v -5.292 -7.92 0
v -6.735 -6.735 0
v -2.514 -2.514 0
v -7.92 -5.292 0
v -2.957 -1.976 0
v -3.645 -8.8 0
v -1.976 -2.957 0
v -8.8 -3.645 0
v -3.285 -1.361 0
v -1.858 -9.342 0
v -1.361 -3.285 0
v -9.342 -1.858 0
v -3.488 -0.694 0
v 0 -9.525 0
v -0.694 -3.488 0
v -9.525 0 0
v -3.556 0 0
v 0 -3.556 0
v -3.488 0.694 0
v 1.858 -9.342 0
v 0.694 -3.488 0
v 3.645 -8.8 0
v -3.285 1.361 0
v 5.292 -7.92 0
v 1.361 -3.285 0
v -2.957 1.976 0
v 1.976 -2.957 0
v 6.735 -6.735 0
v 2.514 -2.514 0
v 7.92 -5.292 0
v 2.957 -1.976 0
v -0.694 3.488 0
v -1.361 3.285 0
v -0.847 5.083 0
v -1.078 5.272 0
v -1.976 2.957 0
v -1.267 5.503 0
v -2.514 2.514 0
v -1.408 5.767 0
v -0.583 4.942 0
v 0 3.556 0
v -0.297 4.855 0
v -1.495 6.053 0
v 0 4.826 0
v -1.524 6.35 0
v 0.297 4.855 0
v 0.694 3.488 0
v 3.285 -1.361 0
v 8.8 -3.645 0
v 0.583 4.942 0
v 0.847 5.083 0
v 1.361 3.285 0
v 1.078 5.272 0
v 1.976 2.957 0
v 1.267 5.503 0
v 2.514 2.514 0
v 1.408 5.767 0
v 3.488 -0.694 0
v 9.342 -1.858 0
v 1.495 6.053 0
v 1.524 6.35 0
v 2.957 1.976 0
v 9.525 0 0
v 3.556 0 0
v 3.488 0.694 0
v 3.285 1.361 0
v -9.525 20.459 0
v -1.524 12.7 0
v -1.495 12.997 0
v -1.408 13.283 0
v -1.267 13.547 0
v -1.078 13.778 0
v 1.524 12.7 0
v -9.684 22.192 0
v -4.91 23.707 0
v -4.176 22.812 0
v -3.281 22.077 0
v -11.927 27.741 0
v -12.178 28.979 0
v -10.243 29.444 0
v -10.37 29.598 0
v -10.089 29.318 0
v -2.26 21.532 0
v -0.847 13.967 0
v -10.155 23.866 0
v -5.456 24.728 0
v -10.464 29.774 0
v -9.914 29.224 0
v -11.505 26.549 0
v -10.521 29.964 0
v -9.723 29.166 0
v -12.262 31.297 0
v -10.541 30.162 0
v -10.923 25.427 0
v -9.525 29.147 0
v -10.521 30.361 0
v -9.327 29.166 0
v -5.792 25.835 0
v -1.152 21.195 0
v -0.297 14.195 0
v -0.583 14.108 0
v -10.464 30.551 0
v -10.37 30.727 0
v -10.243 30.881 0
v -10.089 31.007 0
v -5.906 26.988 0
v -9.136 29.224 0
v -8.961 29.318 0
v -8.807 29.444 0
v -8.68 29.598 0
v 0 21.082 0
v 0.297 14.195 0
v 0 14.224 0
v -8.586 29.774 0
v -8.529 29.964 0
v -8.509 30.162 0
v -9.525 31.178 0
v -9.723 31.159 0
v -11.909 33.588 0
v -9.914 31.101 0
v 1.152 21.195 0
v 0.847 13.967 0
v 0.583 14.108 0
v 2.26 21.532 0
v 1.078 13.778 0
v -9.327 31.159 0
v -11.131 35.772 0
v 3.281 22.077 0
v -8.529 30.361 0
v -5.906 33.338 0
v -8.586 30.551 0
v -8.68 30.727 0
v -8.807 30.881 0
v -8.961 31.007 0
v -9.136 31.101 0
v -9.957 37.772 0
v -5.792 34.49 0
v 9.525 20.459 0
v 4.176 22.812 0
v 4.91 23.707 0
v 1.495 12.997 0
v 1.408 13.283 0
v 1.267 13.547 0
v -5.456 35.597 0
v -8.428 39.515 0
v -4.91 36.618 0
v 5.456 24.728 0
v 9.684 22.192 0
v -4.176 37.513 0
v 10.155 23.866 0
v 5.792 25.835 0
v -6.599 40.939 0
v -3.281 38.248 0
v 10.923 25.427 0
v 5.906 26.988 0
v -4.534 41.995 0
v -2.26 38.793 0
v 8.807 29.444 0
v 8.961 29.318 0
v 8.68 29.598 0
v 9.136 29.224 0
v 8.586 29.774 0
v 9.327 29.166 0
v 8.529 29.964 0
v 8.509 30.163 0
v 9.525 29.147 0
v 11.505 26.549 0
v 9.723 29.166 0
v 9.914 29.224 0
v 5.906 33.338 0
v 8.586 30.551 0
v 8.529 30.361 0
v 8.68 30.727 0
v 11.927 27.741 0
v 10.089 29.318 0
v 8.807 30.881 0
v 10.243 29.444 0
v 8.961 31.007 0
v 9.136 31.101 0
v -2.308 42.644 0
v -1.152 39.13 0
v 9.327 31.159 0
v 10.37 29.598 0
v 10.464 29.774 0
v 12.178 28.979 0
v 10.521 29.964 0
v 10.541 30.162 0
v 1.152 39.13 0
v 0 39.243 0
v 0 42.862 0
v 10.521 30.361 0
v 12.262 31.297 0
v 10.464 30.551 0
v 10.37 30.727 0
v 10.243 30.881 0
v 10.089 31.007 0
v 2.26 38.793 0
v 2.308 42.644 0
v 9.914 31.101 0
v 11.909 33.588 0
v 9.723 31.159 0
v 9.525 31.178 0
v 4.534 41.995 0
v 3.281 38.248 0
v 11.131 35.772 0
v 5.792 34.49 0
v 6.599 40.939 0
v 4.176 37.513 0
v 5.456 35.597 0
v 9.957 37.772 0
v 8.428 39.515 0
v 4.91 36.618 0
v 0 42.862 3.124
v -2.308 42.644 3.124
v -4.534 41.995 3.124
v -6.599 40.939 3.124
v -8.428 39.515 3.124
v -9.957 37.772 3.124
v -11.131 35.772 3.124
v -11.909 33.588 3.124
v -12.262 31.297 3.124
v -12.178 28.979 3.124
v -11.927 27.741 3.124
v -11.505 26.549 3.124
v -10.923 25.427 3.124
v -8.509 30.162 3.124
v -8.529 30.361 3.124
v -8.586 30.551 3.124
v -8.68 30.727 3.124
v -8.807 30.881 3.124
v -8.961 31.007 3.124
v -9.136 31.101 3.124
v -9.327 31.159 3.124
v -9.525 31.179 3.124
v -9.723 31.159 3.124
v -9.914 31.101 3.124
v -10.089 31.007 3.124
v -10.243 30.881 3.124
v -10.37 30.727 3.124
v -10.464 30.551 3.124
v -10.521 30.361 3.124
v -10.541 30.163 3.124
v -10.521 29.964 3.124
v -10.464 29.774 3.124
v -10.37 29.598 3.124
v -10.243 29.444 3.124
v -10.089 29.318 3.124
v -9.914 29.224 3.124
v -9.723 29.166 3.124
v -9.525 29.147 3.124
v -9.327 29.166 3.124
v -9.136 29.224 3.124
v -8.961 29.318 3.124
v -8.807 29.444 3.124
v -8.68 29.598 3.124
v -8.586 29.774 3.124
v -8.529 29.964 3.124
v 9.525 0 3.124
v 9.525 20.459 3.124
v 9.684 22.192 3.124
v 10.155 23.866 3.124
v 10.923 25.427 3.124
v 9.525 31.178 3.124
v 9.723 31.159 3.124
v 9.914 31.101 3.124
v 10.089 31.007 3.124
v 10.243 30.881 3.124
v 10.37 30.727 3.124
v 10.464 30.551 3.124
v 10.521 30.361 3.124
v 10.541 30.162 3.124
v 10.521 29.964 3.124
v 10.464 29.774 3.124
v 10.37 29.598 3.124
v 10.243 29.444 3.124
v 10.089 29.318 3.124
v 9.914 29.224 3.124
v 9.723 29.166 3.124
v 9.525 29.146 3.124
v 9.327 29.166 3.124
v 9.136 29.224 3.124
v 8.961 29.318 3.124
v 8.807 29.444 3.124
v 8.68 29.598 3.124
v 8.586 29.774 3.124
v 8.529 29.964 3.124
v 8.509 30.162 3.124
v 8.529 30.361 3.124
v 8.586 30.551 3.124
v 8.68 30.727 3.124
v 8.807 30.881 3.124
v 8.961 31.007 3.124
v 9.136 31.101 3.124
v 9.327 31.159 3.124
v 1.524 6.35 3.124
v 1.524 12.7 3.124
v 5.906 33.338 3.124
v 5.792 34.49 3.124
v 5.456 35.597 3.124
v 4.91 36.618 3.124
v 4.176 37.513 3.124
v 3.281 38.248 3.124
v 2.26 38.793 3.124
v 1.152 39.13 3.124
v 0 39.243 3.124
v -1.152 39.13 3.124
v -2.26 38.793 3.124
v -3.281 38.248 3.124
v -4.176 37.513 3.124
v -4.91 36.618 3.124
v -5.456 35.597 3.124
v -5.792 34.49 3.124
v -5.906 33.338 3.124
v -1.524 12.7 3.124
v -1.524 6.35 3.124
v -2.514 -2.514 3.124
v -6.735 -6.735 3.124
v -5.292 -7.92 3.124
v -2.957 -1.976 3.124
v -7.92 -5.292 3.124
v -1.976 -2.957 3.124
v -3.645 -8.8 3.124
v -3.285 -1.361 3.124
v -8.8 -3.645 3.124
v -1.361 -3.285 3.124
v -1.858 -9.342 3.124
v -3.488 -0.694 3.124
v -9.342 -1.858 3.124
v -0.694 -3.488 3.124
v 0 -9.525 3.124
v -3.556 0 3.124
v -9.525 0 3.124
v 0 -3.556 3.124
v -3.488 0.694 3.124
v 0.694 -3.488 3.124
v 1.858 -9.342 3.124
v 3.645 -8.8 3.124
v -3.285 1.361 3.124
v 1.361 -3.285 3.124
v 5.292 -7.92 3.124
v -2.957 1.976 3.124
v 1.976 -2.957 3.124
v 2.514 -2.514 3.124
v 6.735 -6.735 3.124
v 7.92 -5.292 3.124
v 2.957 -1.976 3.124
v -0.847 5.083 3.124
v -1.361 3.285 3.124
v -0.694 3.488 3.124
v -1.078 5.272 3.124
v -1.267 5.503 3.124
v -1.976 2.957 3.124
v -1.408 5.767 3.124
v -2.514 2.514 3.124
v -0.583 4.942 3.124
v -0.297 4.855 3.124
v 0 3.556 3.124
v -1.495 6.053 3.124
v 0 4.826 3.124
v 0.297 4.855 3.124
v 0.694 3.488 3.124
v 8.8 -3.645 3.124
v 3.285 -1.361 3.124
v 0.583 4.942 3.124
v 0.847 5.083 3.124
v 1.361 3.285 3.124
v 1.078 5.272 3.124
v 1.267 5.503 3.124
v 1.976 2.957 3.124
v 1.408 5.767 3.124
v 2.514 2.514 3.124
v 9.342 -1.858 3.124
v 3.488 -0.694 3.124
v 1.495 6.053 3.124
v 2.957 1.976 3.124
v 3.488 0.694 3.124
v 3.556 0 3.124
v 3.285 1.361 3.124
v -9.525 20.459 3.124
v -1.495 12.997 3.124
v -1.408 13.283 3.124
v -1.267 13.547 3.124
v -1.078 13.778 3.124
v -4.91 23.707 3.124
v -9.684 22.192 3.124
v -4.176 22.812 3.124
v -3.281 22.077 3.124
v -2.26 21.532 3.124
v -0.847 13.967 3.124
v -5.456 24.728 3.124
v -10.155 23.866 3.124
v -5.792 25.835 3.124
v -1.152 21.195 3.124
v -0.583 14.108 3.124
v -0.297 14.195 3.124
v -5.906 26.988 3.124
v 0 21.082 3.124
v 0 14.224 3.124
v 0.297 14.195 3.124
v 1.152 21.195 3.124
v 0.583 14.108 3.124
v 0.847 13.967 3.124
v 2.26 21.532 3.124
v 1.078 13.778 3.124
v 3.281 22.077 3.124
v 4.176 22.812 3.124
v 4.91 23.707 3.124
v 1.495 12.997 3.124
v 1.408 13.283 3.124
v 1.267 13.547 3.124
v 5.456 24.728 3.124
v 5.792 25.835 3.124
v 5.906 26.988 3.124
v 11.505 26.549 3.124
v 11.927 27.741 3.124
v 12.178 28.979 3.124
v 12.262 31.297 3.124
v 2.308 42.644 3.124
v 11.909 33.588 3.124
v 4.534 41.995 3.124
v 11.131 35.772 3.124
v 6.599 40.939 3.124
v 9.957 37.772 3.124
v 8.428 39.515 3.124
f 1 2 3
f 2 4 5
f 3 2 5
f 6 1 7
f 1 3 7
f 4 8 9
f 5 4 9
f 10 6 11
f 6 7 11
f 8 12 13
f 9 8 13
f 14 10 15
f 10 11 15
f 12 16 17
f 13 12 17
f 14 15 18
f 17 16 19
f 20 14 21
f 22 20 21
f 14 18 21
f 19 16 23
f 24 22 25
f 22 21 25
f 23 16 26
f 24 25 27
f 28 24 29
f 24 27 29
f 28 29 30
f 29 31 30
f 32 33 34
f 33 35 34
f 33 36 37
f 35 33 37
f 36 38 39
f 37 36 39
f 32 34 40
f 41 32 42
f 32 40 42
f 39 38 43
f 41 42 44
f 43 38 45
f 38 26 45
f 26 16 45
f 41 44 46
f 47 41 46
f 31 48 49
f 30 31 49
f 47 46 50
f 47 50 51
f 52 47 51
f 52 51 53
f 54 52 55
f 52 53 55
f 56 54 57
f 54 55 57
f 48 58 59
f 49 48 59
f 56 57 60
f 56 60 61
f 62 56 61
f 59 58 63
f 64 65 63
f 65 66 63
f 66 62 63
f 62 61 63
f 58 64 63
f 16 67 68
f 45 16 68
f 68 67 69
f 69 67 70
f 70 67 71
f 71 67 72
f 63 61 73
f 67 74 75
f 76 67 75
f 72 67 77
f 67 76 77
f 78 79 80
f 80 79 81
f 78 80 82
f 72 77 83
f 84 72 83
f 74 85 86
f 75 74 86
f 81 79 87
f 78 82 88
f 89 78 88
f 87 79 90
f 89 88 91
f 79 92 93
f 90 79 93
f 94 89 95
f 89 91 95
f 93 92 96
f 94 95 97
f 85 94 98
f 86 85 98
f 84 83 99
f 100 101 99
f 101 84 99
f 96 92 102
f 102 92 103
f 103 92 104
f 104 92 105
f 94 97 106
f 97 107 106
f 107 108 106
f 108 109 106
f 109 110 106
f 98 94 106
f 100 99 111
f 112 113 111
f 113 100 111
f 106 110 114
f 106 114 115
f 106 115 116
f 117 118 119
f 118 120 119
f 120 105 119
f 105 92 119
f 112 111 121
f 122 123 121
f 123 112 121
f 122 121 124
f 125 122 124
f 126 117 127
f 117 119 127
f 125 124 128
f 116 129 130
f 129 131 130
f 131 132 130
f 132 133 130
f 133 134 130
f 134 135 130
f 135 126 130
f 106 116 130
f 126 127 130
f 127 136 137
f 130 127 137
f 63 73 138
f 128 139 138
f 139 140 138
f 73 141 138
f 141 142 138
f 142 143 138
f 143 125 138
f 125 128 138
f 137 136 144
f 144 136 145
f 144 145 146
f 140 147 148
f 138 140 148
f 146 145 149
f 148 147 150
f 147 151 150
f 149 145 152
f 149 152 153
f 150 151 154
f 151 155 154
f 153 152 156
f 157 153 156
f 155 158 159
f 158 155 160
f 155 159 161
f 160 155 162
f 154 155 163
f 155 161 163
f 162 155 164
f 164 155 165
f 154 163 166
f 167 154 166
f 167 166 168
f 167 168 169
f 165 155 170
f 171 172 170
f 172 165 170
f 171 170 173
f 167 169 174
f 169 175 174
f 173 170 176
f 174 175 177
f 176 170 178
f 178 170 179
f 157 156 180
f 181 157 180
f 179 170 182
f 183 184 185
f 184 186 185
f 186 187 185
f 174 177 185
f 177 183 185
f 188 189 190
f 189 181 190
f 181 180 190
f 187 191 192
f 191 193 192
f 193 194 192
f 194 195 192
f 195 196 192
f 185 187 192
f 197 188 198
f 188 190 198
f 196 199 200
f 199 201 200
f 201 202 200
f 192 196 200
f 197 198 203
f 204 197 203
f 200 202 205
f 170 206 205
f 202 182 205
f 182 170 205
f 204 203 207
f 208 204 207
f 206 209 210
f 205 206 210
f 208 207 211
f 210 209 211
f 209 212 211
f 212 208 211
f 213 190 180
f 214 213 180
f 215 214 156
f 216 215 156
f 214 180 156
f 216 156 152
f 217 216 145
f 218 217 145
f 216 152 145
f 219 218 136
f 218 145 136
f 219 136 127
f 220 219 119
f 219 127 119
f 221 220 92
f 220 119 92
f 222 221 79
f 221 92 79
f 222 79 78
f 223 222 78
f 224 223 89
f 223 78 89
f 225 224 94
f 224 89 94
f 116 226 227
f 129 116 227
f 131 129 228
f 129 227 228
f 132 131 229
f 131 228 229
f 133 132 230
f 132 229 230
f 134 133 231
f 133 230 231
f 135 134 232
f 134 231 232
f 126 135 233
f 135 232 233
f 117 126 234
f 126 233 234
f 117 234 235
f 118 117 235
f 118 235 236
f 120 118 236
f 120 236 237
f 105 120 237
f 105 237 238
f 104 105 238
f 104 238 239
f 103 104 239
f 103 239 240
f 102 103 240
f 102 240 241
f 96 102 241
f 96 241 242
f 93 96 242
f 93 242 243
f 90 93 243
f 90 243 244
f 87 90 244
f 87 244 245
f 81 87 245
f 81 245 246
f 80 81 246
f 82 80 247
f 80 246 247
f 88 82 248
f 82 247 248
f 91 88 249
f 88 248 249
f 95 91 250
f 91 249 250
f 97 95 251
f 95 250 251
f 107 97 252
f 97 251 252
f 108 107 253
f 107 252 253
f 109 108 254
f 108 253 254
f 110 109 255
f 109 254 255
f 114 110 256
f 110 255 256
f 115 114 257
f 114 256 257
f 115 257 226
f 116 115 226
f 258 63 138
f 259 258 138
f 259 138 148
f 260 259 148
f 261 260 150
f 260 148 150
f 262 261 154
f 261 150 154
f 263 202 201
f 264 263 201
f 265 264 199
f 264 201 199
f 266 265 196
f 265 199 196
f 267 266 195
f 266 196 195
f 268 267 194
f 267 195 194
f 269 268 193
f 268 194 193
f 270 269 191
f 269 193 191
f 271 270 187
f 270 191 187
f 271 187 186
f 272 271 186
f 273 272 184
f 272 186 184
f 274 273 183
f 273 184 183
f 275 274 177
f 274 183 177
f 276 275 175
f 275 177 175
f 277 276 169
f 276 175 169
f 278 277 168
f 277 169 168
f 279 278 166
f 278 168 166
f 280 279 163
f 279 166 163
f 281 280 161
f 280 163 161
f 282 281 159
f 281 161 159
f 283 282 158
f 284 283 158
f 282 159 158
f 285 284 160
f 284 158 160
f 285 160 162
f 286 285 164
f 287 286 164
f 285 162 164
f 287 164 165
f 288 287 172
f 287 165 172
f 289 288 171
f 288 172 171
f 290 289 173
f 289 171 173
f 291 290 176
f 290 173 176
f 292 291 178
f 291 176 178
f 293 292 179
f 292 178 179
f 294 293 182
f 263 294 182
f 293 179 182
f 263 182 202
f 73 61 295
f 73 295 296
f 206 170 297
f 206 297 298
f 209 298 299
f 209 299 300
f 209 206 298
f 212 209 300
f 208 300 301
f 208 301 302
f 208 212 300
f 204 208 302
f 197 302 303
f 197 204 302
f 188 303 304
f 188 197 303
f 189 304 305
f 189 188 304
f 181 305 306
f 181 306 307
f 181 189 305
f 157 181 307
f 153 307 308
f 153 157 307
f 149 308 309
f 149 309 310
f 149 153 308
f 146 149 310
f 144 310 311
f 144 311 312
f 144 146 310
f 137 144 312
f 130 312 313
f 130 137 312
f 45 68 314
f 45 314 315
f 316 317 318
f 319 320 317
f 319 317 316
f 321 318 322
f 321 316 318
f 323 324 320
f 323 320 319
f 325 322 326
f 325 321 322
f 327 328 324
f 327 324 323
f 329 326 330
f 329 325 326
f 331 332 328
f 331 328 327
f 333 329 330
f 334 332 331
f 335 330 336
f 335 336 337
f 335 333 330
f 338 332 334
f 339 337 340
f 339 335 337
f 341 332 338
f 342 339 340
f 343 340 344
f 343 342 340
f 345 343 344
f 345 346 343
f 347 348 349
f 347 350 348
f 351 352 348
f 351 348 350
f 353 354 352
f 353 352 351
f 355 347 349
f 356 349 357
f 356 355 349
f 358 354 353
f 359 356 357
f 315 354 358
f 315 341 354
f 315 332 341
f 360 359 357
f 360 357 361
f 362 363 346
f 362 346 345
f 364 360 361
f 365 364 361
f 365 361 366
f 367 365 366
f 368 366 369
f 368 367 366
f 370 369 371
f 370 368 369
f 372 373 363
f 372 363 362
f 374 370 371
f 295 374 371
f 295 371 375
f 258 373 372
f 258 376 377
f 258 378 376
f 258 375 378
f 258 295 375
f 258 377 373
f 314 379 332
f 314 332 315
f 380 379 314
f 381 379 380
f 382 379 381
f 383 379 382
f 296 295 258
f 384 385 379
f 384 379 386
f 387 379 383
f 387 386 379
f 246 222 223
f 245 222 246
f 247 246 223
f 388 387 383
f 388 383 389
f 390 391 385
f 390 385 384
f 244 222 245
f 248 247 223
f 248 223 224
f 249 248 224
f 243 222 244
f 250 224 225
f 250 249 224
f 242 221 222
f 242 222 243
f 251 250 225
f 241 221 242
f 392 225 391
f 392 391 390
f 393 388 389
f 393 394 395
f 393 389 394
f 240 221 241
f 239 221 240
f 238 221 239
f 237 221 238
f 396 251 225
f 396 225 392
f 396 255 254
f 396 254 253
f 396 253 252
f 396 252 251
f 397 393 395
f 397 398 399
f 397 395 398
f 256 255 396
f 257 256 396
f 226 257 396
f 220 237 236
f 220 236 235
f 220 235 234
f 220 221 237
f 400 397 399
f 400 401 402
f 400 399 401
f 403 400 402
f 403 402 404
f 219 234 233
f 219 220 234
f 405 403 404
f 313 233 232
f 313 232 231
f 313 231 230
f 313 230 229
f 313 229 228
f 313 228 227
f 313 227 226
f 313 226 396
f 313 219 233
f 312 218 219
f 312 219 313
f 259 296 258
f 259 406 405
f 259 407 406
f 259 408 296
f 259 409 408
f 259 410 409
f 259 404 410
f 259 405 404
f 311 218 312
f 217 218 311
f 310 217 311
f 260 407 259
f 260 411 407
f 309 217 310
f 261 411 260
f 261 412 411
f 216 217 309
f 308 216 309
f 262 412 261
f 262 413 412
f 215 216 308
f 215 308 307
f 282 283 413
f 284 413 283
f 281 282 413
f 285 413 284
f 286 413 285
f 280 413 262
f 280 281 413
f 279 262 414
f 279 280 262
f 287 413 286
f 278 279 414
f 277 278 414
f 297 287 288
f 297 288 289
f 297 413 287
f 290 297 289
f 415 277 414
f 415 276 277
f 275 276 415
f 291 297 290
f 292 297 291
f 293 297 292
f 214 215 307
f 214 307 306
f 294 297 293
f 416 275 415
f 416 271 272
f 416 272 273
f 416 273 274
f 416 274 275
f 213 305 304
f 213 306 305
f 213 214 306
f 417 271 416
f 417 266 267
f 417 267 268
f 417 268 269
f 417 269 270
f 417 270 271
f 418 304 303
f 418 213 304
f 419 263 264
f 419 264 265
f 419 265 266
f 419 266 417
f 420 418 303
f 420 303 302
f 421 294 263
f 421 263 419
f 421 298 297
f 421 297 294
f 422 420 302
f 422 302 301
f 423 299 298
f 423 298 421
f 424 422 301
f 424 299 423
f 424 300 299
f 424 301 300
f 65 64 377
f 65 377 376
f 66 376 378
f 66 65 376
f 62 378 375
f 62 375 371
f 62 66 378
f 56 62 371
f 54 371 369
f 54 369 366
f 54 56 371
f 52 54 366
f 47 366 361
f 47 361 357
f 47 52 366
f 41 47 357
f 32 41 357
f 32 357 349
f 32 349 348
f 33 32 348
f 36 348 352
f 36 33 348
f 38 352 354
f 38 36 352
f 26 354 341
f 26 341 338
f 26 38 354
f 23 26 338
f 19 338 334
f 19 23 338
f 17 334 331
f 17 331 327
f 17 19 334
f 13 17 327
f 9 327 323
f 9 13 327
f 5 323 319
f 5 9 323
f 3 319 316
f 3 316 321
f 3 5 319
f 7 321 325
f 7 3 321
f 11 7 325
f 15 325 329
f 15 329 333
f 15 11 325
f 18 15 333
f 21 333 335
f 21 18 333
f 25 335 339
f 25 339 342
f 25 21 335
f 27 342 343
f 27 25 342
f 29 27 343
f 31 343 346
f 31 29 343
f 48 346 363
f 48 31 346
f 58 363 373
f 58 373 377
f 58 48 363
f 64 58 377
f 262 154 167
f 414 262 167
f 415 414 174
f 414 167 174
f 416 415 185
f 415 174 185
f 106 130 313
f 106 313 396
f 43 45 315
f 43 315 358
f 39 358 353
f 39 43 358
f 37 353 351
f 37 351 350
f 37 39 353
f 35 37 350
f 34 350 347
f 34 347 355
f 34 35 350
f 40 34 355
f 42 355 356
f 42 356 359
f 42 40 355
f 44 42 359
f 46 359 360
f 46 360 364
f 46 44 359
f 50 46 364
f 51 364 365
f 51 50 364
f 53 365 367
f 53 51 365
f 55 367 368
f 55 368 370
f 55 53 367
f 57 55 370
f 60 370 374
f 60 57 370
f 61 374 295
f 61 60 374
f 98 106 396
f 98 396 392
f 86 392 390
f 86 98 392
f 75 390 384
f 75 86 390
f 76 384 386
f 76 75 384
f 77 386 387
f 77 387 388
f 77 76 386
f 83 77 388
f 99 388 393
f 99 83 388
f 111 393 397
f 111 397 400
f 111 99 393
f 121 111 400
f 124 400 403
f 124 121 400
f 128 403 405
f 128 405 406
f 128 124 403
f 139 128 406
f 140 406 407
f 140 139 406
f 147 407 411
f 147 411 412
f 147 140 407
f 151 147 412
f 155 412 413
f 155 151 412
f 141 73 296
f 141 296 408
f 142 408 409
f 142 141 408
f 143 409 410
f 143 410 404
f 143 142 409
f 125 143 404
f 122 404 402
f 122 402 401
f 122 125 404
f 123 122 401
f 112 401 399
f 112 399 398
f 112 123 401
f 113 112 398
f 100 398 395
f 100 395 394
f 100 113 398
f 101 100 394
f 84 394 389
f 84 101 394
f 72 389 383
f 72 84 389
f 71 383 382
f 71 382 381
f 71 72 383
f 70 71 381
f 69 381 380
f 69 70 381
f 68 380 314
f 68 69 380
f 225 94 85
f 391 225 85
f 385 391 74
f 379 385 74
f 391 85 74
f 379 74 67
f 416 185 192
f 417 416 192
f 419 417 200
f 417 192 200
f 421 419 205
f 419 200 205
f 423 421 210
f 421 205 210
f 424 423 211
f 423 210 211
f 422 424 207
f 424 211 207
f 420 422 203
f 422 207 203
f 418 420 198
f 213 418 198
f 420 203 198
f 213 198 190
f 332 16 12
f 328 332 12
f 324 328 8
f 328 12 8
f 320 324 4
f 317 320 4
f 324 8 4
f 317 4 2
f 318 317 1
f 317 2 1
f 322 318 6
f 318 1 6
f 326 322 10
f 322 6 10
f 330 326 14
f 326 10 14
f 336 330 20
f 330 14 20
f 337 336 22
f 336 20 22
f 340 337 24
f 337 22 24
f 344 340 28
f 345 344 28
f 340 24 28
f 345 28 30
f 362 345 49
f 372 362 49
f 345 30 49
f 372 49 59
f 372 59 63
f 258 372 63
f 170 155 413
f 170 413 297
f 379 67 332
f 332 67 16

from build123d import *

# Parameters (mm, degrees)
CROQUIS1_R              = 3.556
SALIENTE_EXTRUIR1_DEPTH = 3.1242
SALIENTE_EXTRUIR3_START = -3.1242
SALIENTE_EXTRUIR3_DEPTH = 3.1242
CROQUIS3_R              = 1.016
CORTAR_EXTRUIR1_DEPTH   = 45.69699718


with BuildPart() as part:
    # Croquis1 → Saliente-Extruir1 (new body)
    with BuildSketch(Plane.XY):
        with BuildLine():
            Line((9.525, 0), (9.525, 33.3375))
            ThreePointArc((9.525, 33.3375), (0, 42.8625), (-9.525, 33.3375))
            Line((-9.525, 33.3375), (-9.525, 0))
            ThreePointArc((-9.525, 0), (0, -9.525), (9.525, 0))
        make_face()
        Circle(CROQUIS1_R, mode=Mode.SUBTRACT)
        with BuildLine():
            ThreePointArc((-5.9055, 26.9875), (0, 21.082), (5.9055, 26.9875))
            Line((5.9055, 26.9875), (5.9055, 33.3375))
            ThreePointArc((5.9055, 33.3375), (0, 39.243), (-5.9055, 33.3375))
            Line((-5.9055, 33.3375), (-5.9055, 26.9875))
        make_face(mode=Mode.SUBTRACT)
        with BuildLine():
            ThreePointArc((1.524, 12.7), (0, 14.224), (-1.524, 12.7))
            Line((-1.524, 12.7), (-1.524, 6.35))
            ThreePointArc((-1.524, 6.35), (0, 4.826), (1.524, 6.35))
            Line((1.524, 6.35), (1.524, 12.7))
        make_face(mode=Mode.SUBTRACT)
    extrude(amount=SALIENTE_EXTRUIR1_DEPTH)

    # Croquis2 → Saliente-Extruir3 (add)
    with BuildSketch(Plane.XY.offset(3.1242).offset(SALIENTE_EXTRUIR3_START)):
        with BuildLine():
            ThreePointArc((-9.525, 33.3375), (-6.735192091, 40.072692091), (0, 42.8625))
            ThreePointArc((0, 42.8625), (-9.233702216, 38.679444926), (-12.178104888, 28.979460428))
            ThreePointArc((-12.178104888, 28.979460428), (-11.736773179, 27.137352023), (-10.922866894, 25.426886118))
            ThreePointArc((-10.922866894, 25.426886118), (-9.881124174, 23.039641343), (-9.525, 20.459458969))
            Line((-9.525, 20.459458969), (-9.525, 29.1465))
            ThreePointArc((-9.525, 29.1465), (-10.541, 30.1625), (-9.525, 31.1785))
            Line((-9.525, 31.1785), (-9.525, 33.3375))
        make_face()
        with BuildLine():
            ThreePointArc((12.178104888, 28.979460428), (9.233702216, 38.679444926), (0, 42.8625))
            ThreePointArc((0, 42.8625), (6.735192091, 40.072692091), (9.525, 33.3375))
            Line((9.525, 33.3375), (9.525, 31.1785))
            ThreePointArc((9.525, 31.1785), (10.541, 30.1625), (9.525, 29.1465))
            Line((9.525, 29.1465), (9.525, 20.459458969))
            ThreePointArc((9.525, 20.459458969), (9.881124174, 23.039641343), (10.922866894, 25.426886118))
            ThreePointArc((10.922866894, 25.426886118), (11.736773179, 27.137352023), (12.178104888, 28.979460428))
        make_face()
    extrude(amount=SALIENTE_EXTRUIR3_DEPTH)

    # Croquis3 → Cortar-Extruir1 (cut, through all)
    with BuildSketch(Plane.XY.offset(3.1242)):
        with Locations((-9.525, 30.1625)):
            Circle(CROQUIS3_R)
        with Locations((9.525, 30.1625)):
            Circle(CROQUIS3_R)
    extrude(amount=-CORTAR_EXTRUIR1_DEPTH, mode=Mode.SUBTRACT)


solid = part.part
